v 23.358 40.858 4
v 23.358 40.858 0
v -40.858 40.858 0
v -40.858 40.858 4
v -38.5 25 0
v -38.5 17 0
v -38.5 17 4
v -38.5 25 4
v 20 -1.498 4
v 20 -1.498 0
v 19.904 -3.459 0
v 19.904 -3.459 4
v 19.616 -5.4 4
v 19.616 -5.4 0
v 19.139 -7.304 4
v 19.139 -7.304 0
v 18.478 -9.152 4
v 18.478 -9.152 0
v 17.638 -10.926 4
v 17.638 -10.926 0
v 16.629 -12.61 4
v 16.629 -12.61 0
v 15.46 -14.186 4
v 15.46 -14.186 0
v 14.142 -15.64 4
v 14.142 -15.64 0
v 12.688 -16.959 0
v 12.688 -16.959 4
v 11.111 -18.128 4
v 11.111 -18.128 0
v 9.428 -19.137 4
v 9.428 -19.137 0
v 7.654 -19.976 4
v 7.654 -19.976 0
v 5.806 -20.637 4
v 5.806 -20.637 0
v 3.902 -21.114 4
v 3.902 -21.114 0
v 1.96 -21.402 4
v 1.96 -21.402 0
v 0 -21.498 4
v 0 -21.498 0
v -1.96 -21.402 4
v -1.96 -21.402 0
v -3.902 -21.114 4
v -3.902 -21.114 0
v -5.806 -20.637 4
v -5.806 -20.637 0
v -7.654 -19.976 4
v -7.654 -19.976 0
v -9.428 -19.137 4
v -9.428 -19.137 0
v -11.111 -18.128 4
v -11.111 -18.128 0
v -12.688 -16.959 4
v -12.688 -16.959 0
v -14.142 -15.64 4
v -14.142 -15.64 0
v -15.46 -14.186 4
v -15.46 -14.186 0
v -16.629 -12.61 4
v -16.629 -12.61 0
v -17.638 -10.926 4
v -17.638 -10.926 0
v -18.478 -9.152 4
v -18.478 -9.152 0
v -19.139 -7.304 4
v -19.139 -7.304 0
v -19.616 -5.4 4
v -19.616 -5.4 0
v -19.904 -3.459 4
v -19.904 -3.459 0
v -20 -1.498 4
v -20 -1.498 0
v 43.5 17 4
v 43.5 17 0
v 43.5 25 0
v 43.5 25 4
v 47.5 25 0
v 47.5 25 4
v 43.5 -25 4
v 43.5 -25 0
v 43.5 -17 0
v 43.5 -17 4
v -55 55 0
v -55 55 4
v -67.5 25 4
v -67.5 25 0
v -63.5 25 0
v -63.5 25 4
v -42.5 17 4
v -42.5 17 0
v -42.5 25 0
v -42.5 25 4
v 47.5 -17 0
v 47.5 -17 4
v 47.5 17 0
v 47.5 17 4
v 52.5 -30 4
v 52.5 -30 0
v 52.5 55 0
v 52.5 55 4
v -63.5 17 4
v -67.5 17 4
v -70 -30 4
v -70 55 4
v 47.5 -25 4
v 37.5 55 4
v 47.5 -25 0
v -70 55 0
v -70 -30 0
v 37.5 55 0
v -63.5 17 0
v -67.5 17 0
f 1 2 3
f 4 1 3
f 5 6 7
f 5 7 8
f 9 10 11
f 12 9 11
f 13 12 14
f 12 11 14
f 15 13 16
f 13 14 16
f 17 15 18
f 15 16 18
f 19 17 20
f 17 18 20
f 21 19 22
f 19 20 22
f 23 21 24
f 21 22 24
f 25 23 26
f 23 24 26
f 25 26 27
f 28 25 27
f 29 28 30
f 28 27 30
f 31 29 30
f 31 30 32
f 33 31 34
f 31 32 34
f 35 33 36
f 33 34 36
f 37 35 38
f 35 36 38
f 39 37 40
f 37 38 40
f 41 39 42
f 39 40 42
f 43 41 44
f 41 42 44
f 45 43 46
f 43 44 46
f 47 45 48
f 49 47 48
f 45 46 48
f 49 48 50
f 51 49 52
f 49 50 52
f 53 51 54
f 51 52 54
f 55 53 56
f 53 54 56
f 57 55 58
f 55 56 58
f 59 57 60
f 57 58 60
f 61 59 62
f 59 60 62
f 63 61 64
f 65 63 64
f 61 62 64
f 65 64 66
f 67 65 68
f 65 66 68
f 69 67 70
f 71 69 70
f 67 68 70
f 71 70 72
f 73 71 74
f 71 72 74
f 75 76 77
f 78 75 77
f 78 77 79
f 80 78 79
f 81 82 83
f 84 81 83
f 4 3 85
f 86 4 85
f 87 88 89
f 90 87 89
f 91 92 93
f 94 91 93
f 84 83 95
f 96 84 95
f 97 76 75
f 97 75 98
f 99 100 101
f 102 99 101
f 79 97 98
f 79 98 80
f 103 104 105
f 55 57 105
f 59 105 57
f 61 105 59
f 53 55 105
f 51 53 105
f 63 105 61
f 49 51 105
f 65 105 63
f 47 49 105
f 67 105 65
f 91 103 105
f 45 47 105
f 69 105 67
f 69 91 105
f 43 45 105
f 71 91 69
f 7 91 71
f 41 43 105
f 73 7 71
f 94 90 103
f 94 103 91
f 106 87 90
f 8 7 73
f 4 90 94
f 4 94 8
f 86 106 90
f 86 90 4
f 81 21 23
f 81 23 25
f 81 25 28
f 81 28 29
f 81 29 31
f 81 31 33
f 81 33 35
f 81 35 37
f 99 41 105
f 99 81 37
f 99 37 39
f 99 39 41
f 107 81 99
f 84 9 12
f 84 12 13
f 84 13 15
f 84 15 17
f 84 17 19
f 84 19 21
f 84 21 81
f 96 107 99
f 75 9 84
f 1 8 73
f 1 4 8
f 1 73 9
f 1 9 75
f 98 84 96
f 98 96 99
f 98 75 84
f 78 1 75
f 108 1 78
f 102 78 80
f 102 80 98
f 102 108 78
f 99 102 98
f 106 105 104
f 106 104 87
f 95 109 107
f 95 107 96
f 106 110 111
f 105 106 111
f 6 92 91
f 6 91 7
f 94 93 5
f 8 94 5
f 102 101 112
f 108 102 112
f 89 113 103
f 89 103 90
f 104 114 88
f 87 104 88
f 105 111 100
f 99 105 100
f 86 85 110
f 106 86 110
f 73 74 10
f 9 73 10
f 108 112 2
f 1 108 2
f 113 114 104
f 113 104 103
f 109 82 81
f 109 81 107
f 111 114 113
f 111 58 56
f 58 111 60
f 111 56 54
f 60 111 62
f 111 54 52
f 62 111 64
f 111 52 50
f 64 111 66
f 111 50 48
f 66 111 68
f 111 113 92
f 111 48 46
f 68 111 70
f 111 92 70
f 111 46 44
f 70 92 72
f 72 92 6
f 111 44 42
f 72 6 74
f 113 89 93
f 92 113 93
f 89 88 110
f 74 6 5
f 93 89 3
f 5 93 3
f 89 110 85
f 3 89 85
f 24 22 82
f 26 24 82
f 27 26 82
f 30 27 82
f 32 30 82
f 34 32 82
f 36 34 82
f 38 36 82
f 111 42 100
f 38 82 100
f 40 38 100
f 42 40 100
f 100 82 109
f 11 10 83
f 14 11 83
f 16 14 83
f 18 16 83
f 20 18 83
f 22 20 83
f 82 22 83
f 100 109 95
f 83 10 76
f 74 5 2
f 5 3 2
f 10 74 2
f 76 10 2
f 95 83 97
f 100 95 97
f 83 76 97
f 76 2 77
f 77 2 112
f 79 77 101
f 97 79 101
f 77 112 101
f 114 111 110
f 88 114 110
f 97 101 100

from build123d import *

# Parameters (mm, degrees)
SKETCH1_W           = 122.5
SKETCH1_H           = 60
SKETCH1_W_2         = 4
SKETCH1_H_2         = 8
BOSS_EXTRUDE1_DEPTH = 4
BOSS_EXTRUDE2_DEPTH = 4


with BuildPart() as part:
    # Sketch1 → Boss-Extrude1 (new body)
    with BuildSketch(Plane.XY):
        with Locations((-8.75, 0)):
            Rectangle(SKETCH1_W, SKETCH1_H)
        with BuildLine():
            Line((-20, -1.498357325), (20, -1.498357325))
            ThreePointArc((20, -1.498357325), (0, -21.498357325), (-20, -1.498357325))
        make_face(mode=Mode.SUBTRACT)
        with Locations((-40.5, 21)):
            Rectangle(SKETCH1_W_2, SKETCH1_H_2, mode=Mode.SUBTRACT)
        with Locations((45.5, 21)):
            Rectangle(SKETCH1_W_2, SKETCH1_H_2, mode=Mode.SUBTRACT)
        with Locations((45.5, -21)):
            Rectangle(SKETCH1_W_2, SKETCH1_H_2, mode=Mode.SUBTRACT)
        with Locations((-65.5, 21)):
            Rectangle(SKETCH1_W_2, SKETCH1_H_2, mode=Mode.SUBTRACT)
    extrude(amount=BOSS_EXTRUDE1_DEPTH)

    # Sketch2 → Boss-Extrude2 (add)
    with BuildSketch(Plane.XY):
        Polygon((-70, 30), (52.5, 30), (52.5, 55), (37.5, 55), (23.357864376, 40.857864376), (-40.857864376, 40.857864376), (-55, 55), (-70, 55), align=None)
    extrude(amount=BOSS_EXTRUDE2_DEPTH)


solid = part.part
